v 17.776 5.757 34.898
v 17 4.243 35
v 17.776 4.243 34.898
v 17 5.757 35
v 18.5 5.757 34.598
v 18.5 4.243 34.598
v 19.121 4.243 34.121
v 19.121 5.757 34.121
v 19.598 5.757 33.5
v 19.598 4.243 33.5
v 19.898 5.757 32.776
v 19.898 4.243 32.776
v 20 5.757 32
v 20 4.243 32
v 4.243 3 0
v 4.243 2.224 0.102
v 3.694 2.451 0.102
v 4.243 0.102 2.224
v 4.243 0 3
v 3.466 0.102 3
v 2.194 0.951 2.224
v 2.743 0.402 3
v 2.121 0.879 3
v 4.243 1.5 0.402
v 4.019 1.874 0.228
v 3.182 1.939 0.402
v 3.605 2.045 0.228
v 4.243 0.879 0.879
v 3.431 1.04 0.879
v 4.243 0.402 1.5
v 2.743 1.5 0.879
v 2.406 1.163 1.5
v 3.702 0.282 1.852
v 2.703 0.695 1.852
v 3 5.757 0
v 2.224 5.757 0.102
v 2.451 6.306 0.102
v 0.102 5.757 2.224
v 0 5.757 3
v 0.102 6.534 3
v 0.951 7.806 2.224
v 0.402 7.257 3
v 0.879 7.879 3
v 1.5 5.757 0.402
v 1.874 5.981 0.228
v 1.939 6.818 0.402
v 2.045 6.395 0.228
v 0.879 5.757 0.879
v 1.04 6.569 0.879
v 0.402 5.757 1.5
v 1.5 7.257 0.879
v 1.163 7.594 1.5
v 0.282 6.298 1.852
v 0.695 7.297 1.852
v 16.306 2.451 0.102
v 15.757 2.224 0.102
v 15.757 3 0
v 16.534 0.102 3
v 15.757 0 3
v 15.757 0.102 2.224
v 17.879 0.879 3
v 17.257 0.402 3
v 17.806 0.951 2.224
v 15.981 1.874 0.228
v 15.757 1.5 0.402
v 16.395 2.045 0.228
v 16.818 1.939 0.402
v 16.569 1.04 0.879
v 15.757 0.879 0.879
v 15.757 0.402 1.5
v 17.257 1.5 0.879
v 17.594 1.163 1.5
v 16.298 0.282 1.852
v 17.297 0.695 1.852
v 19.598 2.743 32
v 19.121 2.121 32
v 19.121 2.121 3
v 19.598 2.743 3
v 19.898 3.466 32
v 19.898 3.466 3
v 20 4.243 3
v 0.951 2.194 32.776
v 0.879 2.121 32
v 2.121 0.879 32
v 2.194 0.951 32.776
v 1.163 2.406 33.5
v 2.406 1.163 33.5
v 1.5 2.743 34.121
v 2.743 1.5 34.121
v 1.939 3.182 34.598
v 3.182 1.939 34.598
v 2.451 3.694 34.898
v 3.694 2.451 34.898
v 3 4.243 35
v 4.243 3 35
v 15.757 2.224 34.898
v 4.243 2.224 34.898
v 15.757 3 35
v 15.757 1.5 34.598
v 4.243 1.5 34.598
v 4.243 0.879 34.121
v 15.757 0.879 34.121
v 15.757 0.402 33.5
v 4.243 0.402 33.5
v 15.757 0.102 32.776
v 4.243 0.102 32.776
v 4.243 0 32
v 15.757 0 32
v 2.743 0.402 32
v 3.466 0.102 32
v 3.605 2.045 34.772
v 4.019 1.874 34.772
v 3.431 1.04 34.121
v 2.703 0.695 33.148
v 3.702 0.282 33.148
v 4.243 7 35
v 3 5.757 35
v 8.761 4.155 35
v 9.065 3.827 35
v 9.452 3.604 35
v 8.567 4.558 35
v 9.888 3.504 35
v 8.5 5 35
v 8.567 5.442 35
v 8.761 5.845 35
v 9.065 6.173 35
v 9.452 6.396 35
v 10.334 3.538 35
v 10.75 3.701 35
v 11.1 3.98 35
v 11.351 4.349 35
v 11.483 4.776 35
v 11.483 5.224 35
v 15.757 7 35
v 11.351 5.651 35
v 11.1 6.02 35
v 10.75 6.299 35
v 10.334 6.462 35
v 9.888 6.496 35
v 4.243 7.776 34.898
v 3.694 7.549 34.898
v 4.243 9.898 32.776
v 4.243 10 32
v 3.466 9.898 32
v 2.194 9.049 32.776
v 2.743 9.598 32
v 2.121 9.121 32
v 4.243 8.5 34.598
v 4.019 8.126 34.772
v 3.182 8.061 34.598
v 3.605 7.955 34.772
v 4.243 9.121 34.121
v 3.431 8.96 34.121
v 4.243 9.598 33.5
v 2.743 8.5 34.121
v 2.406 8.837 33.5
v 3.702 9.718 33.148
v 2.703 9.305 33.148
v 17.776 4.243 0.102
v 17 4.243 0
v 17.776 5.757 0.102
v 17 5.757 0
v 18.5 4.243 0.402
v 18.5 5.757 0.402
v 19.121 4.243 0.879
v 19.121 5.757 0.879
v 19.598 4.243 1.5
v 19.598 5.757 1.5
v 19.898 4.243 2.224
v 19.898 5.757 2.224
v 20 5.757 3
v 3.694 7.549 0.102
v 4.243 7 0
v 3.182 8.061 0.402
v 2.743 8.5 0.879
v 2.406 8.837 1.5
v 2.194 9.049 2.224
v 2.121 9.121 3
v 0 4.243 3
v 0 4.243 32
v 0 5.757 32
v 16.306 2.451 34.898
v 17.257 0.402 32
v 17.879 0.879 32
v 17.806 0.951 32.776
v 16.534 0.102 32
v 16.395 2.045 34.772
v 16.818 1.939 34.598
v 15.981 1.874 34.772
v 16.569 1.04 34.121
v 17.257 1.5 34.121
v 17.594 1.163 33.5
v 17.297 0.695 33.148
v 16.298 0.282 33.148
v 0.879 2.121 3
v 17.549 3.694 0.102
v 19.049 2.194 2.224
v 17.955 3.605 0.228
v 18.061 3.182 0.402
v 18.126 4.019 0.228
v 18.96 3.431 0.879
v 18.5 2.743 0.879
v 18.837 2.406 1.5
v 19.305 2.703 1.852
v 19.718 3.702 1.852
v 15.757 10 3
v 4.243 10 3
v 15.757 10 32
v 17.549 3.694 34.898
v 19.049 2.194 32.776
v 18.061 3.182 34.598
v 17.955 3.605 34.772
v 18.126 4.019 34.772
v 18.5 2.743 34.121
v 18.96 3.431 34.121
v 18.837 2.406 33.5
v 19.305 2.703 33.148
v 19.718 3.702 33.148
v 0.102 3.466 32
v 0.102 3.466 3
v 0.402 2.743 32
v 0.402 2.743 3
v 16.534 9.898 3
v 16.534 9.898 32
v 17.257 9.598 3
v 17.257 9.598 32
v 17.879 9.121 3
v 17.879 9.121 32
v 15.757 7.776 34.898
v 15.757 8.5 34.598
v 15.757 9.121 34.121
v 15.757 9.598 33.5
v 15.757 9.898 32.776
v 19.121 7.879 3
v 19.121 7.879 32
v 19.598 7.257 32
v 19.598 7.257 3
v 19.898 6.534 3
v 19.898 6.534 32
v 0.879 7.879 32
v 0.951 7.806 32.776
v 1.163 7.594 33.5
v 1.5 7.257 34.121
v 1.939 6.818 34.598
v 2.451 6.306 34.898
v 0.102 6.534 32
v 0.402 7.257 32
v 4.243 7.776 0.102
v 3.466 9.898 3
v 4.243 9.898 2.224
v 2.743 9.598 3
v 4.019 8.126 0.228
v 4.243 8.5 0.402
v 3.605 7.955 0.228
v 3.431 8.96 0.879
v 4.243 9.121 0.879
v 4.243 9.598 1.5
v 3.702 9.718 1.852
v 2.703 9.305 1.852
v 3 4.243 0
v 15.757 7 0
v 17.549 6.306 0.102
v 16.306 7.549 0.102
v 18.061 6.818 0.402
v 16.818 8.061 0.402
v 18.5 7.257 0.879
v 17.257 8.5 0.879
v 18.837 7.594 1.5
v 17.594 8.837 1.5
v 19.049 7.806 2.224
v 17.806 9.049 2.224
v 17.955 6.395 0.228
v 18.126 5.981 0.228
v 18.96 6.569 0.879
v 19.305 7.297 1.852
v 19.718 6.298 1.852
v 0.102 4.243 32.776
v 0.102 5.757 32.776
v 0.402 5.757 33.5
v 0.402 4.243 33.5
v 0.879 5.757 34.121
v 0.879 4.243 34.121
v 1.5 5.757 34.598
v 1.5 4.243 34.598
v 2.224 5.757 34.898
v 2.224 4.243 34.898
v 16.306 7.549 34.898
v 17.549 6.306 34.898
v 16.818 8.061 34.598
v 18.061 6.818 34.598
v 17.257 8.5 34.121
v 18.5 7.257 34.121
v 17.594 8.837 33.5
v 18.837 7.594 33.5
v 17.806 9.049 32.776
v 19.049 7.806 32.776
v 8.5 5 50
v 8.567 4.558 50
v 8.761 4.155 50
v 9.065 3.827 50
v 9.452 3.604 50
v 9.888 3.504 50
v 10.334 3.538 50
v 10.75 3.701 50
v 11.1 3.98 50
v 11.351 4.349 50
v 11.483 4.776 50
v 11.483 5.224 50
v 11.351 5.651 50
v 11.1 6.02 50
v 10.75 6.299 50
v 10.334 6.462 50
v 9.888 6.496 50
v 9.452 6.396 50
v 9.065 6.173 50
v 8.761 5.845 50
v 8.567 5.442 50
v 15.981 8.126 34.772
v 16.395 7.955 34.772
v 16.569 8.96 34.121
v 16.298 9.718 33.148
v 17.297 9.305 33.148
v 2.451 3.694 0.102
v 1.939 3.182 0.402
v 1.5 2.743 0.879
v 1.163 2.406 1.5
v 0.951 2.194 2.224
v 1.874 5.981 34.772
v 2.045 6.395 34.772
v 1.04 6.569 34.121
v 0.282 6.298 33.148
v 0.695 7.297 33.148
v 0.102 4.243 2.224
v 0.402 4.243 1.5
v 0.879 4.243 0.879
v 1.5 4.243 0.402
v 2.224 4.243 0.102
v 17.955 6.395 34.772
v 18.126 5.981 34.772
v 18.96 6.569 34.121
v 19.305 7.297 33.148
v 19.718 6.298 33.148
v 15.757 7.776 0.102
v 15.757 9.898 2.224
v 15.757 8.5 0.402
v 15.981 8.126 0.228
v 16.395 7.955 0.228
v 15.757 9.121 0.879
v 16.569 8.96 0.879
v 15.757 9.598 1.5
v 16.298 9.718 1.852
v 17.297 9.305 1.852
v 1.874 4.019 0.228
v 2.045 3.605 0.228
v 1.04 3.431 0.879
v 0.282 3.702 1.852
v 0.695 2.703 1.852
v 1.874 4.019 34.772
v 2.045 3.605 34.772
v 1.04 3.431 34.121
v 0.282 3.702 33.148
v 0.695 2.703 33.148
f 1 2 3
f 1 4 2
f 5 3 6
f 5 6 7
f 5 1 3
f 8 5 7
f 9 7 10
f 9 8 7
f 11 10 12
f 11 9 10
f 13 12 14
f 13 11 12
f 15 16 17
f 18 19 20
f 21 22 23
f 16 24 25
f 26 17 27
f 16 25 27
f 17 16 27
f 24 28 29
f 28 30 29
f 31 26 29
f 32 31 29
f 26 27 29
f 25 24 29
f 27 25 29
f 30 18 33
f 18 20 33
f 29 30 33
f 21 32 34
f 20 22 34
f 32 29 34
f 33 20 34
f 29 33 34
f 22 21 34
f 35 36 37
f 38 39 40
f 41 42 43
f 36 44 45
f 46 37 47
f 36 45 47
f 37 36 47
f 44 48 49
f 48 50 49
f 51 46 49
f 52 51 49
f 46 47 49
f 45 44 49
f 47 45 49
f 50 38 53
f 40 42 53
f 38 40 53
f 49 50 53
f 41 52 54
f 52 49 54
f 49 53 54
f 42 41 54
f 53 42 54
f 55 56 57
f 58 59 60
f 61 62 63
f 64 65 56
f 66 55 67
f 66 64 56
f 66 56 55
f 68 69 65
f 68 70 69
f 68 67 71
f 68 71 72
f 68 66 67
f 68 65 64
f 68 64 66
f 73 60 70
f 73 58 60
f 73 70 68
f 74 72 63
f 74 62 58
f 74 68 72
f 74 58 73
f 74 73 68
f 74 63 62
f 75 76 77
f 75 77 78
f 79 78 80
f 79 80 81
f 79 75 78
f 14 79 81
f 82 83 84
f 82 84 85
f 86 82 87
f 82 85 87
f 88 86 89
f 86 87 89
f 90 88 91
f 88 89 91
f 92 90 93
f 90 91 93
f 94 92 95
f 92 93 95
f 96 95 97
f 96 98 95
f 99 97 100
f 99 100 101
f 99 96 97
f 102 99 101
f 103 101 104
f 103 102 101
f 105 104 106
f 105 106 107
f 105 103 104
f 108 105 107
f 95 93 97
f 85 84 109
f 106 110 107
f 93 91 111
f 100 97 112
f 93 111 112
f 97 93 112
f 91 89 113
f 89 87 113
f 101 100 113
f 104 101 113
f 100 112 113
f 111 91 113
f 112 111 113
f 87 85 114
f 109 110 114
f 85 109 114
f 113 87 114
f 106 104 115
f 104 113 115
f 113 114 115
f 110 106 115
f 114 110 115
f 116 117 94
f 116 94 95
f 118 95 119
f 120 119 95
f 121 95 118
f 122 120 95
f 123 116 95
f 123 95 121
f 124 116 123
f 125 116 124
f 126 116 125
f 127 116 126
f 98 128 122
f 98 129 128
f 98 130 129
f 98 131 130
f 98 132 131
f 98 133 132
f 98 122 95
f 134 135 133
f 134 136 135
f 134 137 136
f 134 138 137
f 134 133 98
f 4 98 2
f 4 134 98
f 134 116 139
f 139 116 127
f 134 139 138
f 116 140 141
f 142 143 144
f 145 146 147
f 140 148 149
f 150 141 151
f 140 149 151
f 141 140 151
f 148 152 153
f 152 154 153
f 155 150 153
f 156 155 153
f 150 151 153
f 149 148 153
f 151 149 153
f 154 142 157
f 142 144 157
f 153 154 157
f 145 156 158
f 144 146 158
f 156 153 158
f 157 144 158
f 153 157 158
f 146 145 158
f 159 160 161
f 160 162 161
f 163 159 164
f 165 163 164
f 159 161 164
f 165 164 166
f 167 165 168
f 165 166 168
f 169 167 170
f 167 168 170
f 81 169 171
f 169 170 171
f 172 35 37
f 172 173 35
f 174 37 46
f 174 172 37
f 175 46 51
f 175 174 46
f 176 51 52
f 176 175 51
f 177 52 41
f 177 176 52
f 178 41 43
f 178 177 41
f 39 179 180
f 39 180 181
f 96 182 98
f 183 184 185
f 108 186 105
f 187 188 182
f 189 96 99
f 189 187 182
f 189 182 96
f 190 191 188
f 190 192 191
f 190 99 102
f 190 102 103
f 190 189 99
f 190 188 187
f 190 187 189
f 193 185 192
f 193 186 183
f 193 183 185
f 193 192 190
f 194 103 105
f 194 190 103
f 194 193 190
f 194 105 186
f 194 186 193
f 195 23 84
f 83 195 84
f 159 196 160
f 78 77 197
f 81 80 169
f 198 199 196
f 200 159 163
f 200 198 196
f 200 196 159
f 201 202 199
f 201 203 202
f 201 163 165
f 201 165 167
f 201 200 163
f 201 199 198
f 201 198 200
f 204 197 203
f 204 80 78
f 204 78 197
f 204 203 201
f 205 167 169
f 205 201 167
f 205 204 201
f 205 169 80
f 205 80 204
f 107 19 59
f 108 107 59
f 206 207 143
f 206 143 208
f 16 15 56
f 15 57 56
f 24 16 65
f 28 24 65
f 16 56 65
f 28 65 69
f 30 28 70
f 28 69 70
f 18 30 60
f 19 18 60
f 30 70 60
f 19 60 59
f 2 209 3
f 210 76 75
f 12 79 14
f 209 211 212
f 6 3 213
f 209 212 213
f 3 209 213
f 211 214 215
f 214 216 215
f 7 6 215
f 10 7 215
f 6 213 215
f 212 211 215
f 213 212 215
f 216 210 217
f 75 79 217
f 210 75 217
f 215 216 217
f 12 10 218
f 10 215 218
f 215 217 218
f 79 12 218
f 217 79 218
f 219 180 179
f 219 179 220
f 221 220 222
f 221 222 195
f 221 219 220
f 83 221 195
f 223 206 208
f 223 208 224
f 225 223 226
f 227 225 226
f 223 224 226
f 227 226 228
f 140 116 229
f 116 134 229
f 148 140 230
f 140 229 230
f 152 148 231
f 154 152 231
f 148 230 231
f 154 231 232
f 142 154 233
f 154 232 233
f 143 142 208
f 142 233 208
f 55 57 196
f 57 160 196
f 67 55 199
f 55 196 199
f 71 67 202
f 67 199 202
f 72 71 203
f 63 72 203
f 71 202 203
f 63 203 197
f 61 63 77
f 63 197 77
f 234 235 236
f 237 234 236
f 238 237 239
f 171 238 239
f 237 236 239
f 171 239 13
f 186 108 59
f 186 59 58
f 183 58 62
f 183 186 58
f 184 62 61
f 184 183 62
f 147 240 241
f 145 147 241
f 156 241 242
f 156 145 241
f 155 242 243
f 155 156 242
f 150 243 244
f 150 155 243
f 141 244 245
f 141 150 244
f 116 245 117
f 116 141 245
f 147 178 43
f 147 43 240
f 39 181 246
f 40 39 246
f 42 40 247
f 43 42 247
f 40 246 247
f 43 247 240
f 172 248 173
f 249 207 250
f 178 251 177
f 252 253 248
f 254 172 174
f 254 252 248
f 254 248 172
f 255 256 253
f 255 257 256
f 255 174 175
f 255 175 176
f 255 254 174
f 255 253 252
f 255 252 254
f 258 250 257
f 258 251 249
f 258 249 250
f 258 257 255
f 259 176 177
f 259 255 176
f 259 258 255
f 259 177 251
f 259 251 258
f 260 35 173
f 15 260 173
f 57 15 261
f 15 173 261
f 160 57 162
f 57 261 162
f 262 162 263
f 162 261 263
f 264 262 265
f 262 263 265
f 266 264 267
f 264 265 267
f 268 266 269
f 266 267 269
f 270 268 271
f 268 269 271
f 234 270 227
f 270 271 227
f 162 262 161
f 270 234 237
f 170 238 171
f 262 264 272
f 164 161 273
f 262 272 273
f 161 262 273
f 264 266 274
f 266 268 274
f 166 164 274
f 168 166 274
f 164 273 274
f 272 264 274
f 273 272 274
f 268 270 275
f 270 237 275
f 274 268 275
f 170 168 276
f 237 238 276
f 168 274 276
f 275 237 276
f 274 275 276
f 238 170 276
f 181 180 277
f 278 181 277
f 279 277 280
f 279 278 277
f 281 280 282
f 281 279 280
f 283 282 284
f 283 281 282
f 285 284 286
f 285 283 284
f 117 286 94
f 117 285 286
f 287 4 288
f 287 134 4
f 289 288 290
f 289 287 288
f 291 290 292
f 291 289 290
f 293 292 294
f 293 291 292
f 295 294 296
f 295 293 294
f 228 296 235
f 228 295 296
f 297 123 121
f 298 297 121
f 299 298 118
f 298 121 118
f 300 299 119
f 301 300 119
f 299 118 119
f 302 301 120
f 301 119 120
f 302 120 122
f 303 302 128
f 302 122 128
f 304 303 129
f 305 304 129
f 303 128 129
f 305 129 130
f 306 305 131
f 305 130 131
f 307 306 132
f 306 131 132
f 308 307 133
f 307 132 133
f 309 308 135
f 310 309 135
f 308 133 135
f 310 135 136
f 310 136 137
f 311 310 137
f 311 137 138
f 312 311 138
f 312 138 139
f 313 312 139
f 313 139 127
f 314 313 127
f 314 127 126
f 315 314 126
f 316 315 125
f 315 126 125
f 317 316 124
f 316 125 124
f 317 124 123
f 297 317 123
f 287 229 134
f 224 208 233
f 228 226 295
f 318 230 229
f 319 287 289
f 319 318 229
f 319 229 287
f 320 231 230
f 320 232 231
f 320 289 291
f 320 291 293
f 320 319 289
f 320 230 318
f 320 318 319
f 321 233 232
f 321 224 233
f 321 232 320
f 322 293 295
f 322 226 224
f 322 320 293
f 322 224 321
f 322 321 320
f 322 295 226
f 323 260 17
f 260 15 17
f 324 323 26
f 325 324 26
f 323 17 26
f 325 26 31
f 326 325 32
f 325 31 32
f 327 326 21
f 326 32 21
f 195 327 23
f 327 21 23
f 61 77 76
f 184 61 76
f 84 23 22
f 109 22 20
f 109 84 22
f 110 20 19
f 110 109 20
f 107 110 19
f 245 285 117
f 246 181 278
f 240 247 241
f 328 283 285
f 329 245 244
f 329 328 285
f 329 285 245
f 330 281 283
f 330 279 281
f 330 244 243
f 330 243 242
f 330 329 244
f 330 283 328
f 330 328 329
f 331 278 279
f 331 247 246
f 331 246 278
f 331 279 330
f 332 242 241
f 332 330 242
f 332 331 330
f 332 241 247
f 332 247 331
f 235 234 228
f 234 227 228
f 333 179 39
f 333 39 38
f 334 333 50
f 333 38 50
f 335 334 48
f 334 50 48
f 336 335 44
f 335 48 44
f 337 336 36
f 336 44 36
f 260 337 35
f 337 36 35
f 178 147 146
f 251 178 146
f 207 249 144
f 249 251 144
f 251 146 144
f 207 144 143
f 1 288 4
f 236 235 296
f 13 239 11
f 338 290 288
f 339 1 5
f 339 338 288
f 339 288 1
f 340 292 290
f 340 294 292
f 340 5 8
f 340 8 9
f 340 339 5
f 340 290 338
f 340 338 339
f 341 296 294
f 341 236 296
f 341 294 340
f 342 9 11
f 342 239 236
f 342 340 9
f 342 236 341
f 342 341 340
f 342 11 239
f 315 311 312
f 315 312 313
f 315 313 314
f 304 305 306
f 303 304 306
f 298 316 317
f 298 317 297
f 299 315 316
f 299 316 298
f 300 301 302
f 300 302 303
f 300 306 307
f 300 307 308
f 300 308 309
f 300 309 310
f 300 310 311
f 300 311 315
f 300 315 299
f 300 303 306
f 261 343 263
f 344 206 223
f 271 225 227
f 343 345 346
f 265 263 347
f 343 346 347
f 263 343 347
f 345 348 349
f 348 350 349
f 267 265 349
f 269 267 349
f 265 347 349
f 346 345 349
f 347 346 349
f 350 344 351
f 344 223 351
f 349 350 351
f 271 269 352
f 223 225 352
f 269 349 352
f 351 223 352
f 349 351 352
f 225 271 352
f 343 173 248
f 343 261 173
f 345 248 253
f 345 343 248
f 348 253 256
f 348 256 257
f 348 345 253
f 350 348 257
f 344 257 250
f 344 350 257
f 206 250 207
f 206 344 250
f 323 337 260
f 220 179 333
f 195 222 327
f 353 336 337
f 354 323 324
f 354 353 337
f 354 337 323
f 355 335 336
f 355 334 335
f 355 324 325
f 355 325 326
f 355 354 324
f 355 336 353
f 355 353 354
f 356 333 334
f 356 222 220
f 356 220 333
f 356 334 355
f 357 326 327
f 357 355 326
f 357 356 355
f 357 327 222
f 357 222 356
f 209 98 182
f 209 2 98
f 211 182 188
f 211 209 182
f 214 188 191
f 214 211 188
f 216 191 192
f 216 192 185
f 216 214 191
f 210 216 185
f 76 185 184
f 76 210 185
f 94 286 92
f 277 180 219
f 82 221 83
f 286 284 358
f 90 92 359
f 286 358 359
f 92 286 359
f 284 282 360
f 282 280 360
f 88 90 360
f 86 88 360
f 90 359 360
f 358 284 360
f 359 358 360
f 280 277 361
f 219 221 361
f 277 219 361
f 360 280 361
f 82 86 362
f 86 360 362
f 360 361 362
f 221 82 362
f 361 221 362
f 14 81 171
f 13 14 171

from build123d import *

# Parameters (mm, degrees)
SKETCH_1_W      = 20
SKETCH_1_H      = 10
EXTRUDE_1_DEPTH = 35
CHAMFER_2_SIZE  = 3
FILLET_1_R      = 3
SKETCH_2_R      = 1.5
EXTRUDE_2_DEPTH = 15


with BuildPart() as part:
    # 草图1 → 凸台-拉伸1 (new body)
    with BuildSketch(Plane.XY):
        with Locations((10, 5)):
            Rectangle(SKETCH_1_W, SKETCH_1_H)
    extrude(amount=EXTRUDE_1_DEPTH)

    # 倒角2
    chamfer_2_edges = [part.edges().sort_by_distance(p)[0] for p in [
        (0, 0, 17.5),
        (0, 10, 17.5),
        (20, 10, 17.5),
        (20, 0, 17.5),
    ]]
    chamfer(chamfer_2_edges, length=CHAMFER_2_SIZE)

    # 圆角1
    fillet_1_edges = [part.edges().sort_by_distance(p)[0] for p in [
        (20, 5, 0),
        (20, 5, 35),
        (20, 7, 17.5),
        (20, 3, 17.5),
        (10, 0, 0),
        (0, 5, 0),
        (10, 10, 0),
        (18.5, 8.5, 0),
        (1.5, 8.5, 0),
        (1.5, 1.5, 0),
        (18.5, 1.5, 0),
        (10, 0, 35),
        (3, 0, 17.5),
        (17, 0, 17.5),
        (10, 10, 35),
        (0, 5, 35),
        (18.5, 8.5, 35),
        (1.5, 8.5, 35),
        (1.5, 1.5, 35),
        (18.5, 1.5, 35),
        (0, 7, 17.5),
        (0, 3, 17.5),
        (17, 10, 17.5),
        (3, 10, 17.5),
    ]]
    fillet(fillet_1_edges, radius=FILLET_1_R)

    # 草图2 → 凸台-拉伸2 (add)
    with BuildSketch(Plane.XY.offset(35)):
        with Locations(Location((10, 5, 0), (0, 0, 180))):
            Circle(SKETCH_2_R)
    extrude(amount=EXTRUDE_2_DEPTH)


solid = part.part
